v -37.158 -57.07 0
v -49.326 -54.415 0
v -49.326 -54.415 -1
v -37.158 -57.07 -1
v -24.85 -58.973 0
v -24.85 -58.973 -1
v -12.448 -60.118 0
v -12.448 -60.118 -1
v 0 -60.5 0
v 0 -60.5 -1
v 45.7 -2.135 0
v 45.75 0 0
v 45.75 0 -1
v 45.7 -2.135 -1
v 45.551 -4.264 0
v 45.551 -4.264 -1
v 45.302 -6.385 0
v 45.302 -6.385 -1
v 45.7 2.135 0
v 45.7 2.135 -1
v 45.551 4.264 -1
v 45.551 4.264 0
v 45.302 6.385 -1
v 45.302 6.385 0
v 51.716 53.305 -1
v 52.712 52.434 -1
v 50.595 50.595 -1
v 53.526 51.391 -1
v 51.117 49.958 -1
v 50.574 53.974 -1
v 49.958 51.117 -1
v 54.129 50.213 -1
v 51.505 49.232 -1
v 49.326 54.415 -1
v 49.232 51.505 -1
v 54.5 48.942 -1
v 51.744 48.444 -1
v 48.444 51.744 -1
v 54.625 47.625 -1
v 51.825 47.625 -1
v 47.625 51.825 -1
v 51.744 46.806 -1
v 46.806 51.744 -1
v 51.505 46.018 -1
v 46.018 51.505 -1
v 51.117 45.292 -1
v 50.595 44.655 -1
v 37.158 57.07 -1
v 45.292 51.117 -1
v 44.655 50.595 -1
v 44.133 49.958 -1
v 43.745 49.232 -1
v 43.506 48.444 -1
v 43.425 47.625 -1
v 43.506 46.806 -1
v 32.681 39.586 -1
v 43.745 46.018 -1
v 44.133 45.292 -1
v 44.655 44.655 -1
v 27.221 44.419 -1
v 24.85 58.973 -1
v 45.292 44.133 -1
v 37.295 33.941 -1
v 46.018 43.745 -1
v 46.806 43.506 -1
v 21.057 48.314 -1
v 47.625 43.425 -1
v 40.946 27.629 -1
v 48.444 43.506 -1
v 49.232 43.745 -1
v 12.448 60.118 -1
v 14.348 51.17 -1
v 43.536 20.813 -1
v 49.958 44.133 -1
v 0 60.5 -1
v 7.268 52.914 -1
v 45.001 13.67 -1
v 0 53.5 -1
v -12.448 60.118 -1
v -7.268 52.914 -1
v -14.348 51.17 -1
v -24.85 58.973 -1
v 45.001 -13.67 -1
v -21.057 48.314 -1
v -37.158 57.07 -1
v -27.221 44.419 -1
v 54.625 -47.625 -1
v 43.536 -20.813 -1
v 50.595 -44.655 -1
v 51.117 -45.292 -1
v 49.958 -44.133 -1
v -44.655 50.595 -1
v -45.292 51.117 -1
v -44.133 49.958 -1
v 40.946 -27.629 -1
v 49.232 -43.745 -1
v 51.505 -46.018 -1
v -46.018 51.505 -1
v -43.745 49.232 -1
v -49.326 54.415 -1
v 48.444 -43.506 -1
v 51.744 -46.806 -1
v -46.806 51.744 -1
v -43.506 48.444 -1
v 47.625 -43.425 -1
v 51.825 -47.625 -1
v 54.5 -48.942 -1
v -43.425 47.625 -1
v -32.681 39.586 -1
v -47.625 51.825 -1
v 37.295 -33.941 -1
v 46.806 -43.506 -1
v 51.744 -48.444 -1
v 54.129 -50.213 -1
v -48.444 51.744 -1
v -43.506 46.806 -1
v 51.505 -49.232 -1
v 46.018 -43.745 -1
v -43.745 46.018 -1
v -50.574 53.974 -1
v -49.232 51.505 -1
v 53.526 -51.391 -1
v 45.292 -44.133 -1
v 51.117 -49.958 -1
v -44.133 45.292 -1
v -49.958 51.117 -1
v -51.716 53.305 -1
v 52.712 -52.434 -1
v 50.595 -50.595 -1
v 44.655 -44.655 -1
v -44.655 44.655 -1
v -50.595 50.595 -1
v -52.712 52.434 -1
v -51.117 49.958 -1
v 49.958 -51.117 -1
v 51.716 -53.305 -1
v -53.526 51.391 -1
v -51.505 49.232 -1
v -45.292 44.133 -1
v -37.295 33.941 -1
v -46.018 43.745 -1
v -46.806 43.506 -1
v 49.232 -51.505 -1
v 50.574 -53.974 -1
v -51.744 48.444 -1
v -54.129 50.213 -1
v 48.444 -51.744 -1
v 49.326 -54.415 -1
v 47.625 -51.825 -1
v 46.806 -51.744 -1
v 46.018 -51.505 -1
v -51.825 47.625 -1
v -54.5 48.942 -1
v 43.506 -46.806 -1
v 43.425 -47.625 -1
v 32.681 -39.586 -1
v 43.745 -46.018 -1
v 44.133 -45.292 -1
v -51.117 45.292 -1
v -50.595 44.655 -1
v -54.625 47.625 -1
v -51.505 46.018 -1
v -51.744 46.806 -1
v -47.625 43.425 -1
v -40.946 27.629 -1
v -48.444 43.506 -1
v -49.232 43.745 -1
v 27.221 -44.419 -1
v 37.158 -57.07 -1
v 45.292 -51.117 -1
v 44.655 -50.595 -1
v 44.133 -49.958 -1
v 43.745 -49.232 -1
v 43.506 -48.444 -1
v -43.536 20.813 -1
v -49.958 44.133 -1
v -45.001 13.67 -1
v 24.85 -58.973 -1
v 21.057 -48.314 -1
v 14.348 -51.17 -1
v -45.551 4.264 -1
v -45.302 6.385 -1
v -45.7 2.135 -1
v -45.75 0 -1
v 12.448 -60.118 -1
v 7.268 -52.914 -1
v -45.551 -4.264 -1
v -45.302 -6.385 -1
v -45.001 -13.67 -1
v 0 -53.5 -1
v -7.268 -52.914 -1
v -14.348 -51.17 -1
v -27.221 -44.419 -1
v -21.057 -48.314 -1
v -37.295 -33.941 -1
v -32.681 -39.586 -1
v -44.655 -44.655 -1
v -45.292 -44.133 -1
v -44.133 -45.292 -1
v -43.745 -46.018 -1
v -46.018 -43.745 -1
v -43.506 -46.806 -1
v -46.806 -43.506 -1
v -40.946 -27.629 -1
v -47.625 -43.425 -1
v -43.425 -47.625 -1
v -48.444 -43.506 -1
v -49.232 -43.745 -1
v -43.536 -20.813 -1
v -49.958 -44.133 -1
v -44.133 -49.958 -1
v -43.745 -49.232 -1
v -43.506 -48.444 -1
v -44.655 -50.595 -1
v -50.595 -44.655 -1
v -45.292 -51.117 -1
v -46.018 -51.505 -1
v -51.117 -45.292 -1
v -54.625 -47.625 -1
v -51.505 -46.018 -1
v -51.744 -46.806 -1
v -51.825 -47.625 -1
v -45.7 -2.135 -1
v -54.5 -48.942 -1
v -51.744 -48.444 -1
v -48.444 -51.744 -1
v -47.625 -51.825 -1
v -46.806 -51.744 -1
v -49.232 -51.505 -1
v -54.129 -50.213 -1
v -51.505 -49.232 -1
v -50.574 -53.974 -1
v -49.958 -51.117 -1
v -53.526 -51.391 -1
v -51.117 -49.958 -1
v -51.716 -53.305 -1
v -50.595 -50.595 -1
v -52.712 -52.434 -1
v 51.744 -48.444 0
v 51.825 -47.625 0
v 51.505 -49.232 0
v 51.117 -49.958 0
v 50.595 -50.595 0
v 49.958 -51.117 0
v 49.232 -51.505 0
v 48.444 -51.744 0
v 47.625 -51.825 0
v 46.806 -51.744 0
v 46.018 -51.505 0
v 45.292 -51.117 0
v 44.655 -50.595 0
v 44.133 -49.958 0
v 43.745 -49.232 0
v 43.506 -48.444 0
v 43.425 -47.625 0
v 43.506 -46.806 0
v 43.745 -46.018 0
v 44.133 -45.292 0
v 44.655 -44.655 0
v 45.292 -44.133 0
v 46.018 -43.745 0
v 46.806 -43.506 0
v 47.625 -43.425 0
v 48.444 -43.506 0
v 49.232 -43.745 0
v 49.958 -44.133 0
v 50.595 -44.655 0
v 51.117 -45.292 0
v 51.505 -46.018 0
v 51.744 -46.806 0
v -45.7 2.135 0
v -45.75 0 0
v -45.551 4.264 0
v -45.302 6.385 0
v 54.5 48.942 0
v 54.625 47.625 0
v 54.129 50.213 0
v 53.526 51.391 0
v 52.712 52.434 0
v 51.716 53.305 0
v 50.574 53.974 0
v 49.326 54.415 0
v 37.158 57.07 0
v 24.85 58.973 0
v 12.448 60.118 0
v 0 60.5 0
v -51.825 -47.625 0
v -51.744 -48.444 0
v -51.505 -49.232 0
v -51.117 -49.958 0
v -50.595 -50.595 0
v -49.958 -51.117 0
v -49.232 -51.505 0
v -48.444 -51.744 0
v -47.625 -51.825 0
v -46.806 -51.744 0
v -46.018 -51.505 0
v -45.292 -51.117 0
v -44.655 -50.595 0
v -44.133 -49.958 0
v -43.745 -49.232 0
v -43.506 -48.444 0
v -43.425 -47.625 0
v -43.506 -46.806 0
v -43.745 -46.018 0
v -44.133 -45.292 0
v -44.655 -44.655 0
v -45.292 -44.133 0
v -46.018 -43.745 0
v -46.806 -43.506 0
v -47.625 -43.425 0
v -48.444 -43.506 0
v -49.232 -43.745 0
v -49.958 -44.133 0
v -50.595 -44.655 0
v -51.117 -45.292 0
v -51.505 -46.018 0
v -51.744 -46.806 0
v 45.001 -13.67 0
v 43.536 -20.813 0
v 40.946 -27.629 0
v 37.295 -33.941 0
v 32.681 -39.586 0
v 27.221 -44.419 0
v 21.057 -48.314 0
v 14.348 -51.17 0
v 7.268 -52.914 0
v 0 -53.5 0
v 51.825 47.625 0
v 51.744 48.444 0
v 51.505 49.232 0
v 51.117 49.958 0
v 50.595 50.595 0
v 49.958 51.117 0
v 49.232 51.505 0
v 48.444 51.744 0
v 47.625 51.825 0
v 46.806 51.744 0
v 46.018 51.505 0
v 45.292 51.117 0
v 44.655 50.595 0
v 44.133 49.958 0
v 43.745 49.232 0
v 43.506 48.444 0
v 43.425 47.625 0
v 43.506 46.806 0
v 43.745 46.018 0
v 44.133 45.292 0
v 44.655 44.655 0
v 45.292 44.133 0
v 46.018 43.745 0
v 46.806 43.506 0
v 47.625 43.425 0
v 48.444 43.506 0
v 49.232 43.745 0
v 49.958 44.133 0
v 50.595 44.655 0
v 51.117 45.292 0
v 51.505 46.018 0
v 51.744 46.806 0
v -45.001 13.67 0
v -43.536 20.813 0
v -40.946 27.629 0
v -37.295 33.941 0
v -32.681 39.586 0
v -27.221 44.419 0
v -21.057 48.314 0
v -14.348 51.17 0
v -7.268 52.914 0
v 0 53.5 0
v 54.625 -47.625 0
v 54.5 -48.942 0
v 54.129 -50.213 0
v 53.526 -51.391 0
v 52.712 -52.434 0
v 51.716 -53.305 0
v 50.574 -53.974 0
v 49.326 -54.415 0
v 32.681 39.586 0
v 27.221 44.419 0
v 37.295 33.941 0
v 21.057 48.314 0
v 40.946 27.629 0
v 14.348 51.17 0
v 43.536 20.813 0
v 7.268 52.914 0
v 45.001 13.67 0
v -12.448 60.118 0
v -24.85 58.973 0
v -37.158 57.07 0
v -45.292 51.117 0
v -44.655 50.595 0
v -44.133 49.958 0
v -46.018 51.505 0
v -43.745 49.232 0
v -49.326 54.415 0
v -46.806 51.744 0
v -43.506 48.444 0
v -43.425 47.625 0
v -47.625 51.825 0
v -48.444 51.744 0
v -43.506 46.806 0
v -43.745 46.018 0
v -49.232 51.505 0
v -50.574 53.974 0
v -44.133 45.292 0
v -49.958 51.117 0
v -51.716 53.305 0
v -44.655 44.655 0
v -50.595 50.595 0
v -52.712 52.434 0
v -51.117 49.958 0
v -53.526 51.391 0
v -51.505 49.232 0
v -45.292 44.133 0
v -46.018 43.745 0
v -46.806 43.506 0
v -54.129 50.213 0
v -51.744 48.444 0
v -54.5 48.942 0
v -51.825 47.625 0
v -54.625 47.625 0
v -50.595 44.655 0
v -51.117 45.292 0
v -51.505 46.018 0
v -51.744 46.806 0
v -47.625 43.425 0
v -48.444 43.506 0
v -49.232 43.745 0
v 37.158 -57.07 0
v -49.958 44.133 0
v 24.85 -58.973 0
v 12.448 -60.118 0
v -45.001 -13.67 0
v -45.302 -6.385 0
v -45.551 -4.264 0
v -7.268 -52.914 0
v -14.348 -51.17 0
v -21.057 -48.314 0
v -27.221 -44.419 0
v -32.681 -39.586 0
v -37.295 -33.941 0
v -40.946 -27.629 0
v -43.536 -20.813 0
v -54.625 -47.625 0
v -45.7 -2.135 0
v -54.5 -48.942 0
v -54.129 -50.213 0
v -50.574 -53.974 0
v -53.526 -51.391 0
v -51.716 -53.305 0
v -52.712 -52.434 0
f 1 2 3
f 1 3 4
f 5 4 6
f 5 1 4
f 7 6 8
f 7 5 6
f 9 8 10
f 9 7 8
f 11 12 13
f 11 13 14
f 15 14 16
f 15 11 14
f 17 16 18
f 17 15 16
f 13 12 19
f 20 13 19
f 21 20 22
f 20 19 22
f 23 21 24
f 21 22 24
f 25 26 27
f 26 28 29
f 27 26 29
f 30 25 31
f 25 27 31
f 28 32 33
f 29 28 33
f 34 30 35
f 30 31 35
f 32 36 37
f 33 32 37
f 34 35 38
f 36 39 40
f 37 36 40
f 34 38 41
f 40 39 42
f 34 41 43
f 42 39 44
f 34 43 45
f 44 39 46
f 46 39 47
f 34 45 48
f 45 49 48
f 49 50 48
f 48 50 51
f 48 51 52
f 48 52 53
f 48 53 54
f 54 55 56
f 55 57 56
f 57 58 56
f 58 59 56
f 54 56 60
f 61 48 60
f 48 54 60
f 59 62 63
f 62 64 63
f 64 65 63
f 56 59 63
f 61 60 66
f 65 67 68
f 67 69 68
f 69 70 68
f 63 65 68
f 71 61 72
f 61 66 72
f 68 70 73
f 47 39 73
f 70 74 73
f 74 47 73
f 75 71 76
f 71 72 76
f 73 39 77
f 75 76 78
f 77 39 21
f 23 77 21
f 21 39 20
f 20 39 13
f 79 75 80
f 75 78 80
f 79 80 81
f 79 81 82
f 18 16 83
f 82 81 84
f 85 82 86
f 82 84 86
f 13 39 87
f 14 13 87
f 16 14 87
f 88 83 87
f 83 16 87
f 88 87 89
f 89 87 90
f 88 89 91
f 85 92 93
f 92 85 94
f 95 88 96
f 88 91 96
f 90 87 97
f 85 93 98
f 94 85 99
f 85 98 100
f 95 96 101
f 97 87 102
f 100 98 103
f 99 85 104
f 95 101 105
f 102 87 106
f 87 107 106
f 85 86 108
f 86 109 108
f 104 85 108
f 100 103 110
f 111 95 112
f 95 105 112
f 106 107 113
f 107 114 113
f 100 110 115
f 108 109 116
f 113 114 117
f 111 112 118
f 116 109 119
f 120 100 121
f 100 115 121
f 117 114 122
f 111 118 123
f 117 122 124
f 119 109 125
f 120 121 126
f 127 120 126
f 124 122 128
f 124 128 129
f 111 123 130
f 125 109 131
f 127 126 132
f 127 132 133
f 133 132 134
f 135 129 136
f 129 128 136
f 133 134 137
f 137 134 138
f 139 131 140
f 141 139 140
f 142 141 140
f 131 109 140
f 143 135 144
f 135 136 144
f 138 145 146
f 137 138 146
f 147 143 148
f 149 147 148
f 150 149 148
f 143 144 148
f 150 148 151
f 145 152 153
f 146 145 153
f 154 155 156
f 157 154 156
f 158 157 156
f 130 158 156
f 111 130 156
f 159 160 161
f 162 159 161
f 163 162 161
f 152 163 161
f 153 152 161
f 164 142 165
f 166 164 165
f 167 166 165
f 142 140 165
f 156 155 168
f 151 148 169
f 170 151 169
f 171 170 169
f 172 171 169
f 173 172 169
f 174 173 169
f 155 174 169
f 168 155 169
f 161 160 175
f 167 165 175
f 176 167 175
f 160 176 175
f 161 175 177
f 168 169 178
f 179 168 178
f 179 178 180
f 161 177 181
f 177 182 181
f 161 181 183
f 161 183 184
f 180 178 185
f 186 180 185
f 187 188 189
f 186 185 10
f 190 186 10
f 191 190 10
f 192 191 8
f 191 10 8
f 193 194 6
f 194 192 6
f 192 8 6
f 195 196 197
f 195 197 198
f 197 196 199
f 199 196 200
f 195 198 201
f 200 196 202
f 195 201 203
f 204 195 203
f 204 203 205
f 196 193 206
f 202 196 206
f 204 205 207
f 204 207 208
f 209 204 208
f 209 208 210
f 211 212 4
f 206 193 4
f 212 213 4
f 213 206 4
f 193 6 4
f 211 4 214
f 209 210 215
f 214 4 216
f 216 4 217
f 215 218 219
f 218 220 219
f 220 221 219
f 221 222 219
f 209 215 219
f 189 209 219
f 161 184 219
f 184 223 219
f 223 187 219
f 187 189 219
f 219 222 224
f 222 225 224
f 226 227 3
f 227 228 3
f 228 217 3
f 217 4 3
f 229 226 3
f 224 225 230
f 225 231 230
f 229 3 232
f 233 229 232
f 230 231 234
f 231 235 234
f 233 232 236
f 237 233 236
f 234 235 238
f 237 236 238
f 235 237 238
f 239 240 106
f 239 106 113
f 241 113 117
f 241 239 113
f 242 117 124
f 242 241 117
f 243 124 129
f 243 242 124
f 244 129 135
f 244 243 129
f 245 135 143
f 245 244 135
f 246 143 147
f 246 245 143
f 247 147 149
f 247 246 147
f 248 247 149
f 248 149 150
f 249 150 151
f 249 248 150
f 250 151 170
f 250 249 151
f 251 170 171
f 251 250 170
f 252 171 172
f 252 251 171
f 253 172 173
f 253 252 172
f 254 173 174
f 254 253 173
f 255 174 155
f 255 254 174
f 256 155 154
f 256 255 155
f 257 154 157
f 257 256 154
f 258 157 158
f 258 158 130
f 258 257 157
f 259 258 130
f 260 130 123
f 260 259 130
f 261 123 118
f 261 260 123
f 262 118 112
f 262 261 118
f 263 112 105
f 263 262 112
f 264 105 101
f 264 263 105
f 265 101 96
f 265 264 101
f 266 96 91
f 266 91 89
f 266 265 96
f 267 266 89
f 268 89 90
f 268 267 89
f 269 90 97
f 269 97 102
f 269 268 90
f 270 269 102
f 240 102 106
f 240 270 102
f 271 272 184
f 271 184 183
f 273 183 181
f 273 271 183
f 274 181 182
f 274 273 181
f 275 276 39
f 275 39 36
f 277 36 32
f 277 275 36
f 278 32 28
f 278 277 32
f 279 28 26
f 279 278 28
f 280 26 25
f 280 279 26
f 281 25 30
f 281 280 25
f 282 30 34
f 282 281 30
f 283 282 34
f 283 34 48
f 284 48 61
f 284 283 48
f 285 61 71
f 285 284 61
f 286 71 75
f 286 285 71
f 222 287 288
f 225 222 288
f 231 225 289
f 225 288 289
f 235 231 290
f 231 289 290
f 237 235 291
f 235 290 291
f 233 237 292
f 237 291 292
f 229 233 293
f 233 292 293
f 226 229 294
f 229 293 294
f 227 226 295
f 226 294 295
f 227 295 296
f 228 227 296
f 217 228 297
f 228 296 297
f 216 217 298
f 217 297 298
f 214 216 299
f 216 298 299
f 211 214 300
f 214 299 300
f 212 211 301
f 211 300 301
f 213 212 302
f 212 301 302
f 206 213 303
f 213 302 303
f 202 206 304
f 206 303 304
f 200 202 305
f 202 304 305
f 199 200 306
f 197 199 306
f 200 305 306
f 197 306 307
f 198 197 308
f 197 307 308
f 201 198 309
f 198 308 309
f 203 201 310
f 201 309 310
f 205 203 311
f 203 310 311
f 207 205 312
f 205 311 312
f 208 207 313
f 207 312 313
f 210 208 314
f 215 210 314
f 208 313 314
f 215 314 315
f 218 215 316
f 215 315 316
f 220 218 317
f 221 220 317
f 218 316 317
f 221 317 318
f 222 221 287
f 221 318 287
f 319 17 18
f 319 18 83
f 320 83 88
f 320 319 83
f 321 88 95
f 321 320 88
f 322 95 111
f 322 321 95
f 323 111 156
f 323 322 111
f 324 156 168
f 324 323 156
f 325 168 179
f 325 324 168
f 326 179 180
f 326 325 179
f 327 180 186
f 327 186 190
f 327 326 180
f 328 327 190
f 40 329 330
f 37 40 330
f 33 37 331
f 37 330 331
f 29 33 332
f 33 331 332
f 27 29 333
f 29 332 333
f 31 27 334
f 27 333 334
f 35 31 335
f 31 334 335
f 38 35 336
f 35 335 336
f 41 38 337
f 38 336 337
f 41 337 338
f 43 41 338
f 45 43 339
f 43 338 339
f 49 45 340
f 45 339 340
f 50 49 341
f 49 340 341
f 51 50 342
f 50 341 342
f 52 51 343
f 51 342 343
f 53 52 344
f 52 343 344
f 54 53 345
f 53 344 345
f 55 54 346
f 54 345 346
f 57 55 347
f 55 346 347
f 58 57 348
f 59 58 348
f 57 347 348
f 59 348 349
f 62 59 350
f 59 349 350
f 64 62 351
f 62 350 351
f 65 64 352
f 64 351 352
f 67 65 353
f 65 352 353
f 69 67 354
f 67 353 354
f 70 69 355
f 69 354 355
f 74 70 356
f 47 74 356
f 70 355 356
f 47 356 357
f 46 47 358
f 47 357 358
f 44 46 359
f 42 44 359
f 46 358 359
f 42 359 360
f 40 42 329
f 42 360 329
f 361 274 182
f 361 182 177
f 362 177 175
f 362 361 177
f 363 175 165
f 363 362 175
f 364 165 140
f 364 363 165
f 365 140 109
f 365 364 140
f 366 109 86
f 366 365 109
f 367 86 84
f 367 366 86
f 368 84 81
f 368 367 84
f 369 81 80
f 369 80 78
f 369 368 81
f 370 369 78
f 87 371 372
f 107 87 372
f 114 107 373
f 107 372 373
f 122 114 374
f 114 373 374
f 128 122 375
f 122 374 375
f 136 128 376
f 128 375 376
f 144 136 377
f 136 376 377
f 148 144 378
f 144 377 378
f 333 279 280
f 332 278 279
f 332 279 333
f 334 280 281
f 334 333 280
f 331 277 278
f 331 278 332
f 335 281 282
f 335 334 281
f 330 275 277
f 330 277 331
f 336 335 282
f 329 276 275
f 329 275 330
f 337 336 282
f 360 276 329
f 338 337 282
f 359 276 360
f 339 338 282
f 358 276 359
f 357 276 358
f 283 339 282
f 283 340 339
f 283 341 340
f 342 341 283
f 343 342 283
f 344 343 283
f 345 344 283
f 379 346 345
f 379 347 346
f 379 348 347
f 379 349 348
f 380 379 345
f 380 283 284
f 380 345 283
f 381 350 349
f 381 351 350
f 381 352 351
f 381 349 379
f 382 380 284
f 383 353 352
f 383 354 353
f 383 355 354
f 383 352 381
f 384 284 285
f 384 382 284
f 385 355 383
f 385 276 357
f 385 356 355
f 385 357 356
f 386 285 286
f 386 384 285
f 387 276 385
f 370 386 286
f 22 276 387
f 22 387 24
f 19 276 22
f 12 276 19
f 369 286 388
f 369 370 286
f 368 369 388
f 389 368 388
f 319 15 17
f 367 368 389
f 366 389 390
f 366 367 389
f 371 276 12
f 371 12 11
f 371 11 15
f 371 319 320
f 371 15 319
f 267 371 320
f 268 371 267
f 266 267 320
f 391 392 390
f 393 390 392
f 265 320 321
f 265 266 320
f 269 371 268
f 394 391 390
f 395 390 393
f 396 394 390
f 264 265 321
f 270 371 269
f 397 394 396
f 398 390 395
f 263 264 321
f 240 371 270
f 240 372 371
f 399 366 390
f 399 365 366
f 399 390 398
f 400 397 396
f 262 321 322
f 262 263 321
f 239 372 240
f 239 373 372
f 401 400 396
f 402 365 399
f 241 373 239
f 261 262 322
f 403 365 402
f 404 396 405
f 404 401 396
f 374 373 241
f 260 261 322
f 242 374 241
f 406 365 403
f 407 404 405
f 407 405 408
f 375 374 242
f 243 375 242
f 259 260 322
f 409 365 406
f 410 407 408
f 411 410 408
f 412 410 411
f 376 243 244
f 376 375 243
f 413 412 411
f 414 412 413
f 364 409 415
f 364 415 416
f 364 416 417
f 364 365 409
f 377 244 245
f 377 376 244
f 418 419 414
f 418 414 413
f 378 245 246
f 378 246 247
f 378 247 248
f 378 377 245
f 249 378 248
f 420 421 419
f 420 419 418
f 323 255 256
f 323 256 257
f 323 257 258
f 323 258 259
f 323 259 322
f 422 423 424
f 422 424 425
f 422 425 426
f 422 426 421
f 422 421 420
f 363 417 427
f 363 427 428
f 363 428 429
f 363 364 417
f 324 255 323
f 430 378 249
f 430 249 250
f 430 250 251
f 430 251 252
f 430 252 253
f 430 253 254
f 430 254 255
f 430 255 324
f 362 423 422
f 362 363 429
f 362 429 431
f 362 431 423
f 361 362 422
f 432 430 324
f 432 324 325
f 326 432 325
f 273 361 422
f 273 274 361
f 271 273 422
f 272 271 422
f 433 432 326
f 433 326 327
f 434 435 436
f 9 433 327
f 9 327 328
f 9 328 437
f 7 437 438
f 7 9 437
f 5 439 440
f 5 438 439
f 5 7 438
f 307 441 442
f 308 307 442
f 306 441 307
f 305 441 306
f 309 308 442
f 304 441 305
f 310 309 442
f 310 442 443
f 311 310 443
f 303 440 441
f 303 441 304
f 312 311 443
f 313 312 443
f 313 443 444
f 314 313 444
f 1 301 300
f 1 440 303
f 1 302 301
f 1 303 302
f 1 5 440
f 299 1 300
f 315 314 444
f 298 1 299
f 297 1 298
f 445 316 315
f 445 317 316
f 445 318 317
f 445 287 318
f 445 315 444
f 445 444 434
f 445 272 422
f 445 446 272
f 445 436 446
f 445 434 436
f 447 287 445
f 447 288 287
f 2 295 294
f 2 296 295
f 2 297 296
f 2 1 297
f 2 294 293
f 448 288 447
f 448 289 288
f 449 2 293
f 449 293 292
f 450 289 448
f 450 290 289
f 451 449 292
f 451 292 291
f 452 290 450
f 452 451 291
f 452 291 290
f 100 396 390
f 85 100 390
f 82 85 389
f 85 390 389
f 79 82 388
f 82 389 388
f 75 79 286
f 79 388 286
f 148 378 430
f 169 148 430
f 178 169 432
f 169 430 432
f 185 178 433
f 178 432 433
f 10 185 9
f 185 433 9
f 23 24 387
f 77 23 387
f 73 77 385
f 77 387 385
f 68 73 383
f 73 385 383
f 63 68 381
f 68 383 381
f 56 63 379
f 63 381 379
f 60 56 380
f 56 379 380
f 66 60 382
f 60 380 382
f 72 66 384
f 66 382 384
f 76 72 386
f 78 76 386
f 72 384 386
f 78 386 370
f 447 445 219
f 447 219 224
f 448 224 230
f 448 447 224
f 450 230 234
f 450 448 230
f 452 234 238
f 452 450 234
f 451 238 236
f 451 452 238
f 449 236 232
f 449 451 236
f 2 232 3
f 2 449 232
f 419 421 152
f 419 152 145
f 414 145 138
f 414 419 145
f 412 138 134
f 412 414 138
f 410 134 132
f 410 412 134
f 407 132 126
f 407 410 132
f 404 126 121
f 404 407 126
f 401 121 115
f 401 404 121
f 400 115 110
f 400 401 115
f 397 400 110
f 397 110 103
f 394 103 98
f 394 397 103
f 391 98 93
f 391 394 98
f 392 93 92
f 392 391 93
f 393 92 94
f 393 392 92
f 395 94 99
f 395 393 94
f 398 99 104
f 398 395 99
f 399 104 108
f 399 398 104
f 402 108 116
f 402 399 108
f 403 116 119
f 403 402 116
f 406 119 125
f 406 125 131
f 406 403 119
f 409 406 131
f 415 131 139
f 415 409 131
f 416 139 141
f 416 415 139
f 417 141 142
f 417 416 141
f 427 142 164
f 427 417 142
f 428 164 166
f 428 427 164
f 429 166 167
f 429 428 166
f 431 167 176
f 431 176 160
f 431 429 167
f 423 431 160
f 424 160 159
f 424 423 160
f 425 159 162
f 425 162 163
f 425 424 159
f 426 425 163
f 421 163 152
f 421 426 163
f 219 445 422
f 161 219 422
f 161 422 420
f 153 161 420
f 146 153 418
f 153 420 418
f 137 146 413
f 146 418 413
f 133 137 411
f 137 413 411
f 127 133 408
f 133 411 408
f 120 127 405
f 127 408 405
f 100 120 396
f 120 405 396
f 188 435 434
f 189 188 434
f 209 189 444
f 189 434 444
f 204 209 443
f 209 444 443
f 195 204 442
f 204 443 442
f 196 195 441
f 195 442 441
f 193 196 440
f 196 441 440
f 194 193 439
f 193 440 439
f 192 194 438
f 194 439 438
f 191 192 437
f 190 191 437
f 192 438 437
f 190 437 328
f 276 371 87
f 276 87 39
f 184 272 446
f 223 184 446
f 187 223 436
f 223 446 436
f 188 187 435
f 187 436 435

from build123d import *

# Parameters (mm, degrees)
SKETCH007_R                = 4.2
PAD002_DEPTH               = 1
SKETCH007_MIRRORED003_2_R  = 4.2
PAD002_MIRRORED003_2_DEPTH = 1


with BuildPart() as part:
    # Sketch007 → Pad002 (new body)
    with BuildSketch(Plane(origin=(0, 0, 0), x_dir=(-1, 0, 0), z_dir=(0, 0, -1))):
        with BuildLine():
            ThreePointArc((45.75, 0), (45.637926, 3.20034), (45.302255, 6.385))
            ThreePointArc((45.302255, 6.385), (32.680719, 39.586204), (0, 53.5))
            Line((0, 53.5), (0, 60.5))
            ThreePointArc((49.326147, 54.415147), (24.850021, 58.973043), (0, 60.5))
            ThreePointArc((54.625, 47.624978), (53.143522, 51.931496), (49.326147, 54.415147))
            Line((54.625, 47.624978), (54.625, 0))
            Line((54.625, 0), (45.75, 0))
        make_face()
        with Locations((47.625, 47.625)):
            Circle(SKETCH007_R, mode=Mode.SUBTRACT)
    pad002 = extrude(amount=PAD002_DEPTH)

    # Sketch007 Mirrored003 2 → Pad002 Mirrored003 2 (add)
    with BuildSketch(Plane.XY):
        with BuildLine():
            ThreePointArc((45.75, 0), (45.637926, 3.20034), (45.302255, 6.385))
            ThreePointArc((45.302255, 6.385), (32.680719, 39.586204), (0, 53.5))
            Line((0, 53.5), (0, 60.5))
            ThreePointArc((49.326147, 54.415147), (24.850021, 58.973043), (0, 60.5))
            ThreePointArc((54.625, 47.624978), (53.143522, 51.931496), (49.326147, 54.415147))
            Line((54.625, 47.624978), (54.625, 0))
            Line((54.625, 0), (45.75, 0))
        make_face()
        with Locations((47.625, 47.625)):
            Circle(SKETCH007_MIRRORED003_2_R, mode=Mode.SUBTRACT)
    pad002_mirrored003_2 = extrude(amount=-PAD002_MIRRORED003_2_DEPTH)

    # Mirrored004: Pad002, Pad002 Mirrored003 2 across Sketch007 H_Axis
    add(pad002.mirror(Plane(origin=(0, 0, 0), x_dir=(0, 0, -1), z_dir=(0, 1, 0))))
    add(pad002_mirrored003_2.mirror(Plane(origin=(0, 0, 0), x_dir=(0, 0, -1), z_dir=(0, 1, 0))))


solid = part.part
